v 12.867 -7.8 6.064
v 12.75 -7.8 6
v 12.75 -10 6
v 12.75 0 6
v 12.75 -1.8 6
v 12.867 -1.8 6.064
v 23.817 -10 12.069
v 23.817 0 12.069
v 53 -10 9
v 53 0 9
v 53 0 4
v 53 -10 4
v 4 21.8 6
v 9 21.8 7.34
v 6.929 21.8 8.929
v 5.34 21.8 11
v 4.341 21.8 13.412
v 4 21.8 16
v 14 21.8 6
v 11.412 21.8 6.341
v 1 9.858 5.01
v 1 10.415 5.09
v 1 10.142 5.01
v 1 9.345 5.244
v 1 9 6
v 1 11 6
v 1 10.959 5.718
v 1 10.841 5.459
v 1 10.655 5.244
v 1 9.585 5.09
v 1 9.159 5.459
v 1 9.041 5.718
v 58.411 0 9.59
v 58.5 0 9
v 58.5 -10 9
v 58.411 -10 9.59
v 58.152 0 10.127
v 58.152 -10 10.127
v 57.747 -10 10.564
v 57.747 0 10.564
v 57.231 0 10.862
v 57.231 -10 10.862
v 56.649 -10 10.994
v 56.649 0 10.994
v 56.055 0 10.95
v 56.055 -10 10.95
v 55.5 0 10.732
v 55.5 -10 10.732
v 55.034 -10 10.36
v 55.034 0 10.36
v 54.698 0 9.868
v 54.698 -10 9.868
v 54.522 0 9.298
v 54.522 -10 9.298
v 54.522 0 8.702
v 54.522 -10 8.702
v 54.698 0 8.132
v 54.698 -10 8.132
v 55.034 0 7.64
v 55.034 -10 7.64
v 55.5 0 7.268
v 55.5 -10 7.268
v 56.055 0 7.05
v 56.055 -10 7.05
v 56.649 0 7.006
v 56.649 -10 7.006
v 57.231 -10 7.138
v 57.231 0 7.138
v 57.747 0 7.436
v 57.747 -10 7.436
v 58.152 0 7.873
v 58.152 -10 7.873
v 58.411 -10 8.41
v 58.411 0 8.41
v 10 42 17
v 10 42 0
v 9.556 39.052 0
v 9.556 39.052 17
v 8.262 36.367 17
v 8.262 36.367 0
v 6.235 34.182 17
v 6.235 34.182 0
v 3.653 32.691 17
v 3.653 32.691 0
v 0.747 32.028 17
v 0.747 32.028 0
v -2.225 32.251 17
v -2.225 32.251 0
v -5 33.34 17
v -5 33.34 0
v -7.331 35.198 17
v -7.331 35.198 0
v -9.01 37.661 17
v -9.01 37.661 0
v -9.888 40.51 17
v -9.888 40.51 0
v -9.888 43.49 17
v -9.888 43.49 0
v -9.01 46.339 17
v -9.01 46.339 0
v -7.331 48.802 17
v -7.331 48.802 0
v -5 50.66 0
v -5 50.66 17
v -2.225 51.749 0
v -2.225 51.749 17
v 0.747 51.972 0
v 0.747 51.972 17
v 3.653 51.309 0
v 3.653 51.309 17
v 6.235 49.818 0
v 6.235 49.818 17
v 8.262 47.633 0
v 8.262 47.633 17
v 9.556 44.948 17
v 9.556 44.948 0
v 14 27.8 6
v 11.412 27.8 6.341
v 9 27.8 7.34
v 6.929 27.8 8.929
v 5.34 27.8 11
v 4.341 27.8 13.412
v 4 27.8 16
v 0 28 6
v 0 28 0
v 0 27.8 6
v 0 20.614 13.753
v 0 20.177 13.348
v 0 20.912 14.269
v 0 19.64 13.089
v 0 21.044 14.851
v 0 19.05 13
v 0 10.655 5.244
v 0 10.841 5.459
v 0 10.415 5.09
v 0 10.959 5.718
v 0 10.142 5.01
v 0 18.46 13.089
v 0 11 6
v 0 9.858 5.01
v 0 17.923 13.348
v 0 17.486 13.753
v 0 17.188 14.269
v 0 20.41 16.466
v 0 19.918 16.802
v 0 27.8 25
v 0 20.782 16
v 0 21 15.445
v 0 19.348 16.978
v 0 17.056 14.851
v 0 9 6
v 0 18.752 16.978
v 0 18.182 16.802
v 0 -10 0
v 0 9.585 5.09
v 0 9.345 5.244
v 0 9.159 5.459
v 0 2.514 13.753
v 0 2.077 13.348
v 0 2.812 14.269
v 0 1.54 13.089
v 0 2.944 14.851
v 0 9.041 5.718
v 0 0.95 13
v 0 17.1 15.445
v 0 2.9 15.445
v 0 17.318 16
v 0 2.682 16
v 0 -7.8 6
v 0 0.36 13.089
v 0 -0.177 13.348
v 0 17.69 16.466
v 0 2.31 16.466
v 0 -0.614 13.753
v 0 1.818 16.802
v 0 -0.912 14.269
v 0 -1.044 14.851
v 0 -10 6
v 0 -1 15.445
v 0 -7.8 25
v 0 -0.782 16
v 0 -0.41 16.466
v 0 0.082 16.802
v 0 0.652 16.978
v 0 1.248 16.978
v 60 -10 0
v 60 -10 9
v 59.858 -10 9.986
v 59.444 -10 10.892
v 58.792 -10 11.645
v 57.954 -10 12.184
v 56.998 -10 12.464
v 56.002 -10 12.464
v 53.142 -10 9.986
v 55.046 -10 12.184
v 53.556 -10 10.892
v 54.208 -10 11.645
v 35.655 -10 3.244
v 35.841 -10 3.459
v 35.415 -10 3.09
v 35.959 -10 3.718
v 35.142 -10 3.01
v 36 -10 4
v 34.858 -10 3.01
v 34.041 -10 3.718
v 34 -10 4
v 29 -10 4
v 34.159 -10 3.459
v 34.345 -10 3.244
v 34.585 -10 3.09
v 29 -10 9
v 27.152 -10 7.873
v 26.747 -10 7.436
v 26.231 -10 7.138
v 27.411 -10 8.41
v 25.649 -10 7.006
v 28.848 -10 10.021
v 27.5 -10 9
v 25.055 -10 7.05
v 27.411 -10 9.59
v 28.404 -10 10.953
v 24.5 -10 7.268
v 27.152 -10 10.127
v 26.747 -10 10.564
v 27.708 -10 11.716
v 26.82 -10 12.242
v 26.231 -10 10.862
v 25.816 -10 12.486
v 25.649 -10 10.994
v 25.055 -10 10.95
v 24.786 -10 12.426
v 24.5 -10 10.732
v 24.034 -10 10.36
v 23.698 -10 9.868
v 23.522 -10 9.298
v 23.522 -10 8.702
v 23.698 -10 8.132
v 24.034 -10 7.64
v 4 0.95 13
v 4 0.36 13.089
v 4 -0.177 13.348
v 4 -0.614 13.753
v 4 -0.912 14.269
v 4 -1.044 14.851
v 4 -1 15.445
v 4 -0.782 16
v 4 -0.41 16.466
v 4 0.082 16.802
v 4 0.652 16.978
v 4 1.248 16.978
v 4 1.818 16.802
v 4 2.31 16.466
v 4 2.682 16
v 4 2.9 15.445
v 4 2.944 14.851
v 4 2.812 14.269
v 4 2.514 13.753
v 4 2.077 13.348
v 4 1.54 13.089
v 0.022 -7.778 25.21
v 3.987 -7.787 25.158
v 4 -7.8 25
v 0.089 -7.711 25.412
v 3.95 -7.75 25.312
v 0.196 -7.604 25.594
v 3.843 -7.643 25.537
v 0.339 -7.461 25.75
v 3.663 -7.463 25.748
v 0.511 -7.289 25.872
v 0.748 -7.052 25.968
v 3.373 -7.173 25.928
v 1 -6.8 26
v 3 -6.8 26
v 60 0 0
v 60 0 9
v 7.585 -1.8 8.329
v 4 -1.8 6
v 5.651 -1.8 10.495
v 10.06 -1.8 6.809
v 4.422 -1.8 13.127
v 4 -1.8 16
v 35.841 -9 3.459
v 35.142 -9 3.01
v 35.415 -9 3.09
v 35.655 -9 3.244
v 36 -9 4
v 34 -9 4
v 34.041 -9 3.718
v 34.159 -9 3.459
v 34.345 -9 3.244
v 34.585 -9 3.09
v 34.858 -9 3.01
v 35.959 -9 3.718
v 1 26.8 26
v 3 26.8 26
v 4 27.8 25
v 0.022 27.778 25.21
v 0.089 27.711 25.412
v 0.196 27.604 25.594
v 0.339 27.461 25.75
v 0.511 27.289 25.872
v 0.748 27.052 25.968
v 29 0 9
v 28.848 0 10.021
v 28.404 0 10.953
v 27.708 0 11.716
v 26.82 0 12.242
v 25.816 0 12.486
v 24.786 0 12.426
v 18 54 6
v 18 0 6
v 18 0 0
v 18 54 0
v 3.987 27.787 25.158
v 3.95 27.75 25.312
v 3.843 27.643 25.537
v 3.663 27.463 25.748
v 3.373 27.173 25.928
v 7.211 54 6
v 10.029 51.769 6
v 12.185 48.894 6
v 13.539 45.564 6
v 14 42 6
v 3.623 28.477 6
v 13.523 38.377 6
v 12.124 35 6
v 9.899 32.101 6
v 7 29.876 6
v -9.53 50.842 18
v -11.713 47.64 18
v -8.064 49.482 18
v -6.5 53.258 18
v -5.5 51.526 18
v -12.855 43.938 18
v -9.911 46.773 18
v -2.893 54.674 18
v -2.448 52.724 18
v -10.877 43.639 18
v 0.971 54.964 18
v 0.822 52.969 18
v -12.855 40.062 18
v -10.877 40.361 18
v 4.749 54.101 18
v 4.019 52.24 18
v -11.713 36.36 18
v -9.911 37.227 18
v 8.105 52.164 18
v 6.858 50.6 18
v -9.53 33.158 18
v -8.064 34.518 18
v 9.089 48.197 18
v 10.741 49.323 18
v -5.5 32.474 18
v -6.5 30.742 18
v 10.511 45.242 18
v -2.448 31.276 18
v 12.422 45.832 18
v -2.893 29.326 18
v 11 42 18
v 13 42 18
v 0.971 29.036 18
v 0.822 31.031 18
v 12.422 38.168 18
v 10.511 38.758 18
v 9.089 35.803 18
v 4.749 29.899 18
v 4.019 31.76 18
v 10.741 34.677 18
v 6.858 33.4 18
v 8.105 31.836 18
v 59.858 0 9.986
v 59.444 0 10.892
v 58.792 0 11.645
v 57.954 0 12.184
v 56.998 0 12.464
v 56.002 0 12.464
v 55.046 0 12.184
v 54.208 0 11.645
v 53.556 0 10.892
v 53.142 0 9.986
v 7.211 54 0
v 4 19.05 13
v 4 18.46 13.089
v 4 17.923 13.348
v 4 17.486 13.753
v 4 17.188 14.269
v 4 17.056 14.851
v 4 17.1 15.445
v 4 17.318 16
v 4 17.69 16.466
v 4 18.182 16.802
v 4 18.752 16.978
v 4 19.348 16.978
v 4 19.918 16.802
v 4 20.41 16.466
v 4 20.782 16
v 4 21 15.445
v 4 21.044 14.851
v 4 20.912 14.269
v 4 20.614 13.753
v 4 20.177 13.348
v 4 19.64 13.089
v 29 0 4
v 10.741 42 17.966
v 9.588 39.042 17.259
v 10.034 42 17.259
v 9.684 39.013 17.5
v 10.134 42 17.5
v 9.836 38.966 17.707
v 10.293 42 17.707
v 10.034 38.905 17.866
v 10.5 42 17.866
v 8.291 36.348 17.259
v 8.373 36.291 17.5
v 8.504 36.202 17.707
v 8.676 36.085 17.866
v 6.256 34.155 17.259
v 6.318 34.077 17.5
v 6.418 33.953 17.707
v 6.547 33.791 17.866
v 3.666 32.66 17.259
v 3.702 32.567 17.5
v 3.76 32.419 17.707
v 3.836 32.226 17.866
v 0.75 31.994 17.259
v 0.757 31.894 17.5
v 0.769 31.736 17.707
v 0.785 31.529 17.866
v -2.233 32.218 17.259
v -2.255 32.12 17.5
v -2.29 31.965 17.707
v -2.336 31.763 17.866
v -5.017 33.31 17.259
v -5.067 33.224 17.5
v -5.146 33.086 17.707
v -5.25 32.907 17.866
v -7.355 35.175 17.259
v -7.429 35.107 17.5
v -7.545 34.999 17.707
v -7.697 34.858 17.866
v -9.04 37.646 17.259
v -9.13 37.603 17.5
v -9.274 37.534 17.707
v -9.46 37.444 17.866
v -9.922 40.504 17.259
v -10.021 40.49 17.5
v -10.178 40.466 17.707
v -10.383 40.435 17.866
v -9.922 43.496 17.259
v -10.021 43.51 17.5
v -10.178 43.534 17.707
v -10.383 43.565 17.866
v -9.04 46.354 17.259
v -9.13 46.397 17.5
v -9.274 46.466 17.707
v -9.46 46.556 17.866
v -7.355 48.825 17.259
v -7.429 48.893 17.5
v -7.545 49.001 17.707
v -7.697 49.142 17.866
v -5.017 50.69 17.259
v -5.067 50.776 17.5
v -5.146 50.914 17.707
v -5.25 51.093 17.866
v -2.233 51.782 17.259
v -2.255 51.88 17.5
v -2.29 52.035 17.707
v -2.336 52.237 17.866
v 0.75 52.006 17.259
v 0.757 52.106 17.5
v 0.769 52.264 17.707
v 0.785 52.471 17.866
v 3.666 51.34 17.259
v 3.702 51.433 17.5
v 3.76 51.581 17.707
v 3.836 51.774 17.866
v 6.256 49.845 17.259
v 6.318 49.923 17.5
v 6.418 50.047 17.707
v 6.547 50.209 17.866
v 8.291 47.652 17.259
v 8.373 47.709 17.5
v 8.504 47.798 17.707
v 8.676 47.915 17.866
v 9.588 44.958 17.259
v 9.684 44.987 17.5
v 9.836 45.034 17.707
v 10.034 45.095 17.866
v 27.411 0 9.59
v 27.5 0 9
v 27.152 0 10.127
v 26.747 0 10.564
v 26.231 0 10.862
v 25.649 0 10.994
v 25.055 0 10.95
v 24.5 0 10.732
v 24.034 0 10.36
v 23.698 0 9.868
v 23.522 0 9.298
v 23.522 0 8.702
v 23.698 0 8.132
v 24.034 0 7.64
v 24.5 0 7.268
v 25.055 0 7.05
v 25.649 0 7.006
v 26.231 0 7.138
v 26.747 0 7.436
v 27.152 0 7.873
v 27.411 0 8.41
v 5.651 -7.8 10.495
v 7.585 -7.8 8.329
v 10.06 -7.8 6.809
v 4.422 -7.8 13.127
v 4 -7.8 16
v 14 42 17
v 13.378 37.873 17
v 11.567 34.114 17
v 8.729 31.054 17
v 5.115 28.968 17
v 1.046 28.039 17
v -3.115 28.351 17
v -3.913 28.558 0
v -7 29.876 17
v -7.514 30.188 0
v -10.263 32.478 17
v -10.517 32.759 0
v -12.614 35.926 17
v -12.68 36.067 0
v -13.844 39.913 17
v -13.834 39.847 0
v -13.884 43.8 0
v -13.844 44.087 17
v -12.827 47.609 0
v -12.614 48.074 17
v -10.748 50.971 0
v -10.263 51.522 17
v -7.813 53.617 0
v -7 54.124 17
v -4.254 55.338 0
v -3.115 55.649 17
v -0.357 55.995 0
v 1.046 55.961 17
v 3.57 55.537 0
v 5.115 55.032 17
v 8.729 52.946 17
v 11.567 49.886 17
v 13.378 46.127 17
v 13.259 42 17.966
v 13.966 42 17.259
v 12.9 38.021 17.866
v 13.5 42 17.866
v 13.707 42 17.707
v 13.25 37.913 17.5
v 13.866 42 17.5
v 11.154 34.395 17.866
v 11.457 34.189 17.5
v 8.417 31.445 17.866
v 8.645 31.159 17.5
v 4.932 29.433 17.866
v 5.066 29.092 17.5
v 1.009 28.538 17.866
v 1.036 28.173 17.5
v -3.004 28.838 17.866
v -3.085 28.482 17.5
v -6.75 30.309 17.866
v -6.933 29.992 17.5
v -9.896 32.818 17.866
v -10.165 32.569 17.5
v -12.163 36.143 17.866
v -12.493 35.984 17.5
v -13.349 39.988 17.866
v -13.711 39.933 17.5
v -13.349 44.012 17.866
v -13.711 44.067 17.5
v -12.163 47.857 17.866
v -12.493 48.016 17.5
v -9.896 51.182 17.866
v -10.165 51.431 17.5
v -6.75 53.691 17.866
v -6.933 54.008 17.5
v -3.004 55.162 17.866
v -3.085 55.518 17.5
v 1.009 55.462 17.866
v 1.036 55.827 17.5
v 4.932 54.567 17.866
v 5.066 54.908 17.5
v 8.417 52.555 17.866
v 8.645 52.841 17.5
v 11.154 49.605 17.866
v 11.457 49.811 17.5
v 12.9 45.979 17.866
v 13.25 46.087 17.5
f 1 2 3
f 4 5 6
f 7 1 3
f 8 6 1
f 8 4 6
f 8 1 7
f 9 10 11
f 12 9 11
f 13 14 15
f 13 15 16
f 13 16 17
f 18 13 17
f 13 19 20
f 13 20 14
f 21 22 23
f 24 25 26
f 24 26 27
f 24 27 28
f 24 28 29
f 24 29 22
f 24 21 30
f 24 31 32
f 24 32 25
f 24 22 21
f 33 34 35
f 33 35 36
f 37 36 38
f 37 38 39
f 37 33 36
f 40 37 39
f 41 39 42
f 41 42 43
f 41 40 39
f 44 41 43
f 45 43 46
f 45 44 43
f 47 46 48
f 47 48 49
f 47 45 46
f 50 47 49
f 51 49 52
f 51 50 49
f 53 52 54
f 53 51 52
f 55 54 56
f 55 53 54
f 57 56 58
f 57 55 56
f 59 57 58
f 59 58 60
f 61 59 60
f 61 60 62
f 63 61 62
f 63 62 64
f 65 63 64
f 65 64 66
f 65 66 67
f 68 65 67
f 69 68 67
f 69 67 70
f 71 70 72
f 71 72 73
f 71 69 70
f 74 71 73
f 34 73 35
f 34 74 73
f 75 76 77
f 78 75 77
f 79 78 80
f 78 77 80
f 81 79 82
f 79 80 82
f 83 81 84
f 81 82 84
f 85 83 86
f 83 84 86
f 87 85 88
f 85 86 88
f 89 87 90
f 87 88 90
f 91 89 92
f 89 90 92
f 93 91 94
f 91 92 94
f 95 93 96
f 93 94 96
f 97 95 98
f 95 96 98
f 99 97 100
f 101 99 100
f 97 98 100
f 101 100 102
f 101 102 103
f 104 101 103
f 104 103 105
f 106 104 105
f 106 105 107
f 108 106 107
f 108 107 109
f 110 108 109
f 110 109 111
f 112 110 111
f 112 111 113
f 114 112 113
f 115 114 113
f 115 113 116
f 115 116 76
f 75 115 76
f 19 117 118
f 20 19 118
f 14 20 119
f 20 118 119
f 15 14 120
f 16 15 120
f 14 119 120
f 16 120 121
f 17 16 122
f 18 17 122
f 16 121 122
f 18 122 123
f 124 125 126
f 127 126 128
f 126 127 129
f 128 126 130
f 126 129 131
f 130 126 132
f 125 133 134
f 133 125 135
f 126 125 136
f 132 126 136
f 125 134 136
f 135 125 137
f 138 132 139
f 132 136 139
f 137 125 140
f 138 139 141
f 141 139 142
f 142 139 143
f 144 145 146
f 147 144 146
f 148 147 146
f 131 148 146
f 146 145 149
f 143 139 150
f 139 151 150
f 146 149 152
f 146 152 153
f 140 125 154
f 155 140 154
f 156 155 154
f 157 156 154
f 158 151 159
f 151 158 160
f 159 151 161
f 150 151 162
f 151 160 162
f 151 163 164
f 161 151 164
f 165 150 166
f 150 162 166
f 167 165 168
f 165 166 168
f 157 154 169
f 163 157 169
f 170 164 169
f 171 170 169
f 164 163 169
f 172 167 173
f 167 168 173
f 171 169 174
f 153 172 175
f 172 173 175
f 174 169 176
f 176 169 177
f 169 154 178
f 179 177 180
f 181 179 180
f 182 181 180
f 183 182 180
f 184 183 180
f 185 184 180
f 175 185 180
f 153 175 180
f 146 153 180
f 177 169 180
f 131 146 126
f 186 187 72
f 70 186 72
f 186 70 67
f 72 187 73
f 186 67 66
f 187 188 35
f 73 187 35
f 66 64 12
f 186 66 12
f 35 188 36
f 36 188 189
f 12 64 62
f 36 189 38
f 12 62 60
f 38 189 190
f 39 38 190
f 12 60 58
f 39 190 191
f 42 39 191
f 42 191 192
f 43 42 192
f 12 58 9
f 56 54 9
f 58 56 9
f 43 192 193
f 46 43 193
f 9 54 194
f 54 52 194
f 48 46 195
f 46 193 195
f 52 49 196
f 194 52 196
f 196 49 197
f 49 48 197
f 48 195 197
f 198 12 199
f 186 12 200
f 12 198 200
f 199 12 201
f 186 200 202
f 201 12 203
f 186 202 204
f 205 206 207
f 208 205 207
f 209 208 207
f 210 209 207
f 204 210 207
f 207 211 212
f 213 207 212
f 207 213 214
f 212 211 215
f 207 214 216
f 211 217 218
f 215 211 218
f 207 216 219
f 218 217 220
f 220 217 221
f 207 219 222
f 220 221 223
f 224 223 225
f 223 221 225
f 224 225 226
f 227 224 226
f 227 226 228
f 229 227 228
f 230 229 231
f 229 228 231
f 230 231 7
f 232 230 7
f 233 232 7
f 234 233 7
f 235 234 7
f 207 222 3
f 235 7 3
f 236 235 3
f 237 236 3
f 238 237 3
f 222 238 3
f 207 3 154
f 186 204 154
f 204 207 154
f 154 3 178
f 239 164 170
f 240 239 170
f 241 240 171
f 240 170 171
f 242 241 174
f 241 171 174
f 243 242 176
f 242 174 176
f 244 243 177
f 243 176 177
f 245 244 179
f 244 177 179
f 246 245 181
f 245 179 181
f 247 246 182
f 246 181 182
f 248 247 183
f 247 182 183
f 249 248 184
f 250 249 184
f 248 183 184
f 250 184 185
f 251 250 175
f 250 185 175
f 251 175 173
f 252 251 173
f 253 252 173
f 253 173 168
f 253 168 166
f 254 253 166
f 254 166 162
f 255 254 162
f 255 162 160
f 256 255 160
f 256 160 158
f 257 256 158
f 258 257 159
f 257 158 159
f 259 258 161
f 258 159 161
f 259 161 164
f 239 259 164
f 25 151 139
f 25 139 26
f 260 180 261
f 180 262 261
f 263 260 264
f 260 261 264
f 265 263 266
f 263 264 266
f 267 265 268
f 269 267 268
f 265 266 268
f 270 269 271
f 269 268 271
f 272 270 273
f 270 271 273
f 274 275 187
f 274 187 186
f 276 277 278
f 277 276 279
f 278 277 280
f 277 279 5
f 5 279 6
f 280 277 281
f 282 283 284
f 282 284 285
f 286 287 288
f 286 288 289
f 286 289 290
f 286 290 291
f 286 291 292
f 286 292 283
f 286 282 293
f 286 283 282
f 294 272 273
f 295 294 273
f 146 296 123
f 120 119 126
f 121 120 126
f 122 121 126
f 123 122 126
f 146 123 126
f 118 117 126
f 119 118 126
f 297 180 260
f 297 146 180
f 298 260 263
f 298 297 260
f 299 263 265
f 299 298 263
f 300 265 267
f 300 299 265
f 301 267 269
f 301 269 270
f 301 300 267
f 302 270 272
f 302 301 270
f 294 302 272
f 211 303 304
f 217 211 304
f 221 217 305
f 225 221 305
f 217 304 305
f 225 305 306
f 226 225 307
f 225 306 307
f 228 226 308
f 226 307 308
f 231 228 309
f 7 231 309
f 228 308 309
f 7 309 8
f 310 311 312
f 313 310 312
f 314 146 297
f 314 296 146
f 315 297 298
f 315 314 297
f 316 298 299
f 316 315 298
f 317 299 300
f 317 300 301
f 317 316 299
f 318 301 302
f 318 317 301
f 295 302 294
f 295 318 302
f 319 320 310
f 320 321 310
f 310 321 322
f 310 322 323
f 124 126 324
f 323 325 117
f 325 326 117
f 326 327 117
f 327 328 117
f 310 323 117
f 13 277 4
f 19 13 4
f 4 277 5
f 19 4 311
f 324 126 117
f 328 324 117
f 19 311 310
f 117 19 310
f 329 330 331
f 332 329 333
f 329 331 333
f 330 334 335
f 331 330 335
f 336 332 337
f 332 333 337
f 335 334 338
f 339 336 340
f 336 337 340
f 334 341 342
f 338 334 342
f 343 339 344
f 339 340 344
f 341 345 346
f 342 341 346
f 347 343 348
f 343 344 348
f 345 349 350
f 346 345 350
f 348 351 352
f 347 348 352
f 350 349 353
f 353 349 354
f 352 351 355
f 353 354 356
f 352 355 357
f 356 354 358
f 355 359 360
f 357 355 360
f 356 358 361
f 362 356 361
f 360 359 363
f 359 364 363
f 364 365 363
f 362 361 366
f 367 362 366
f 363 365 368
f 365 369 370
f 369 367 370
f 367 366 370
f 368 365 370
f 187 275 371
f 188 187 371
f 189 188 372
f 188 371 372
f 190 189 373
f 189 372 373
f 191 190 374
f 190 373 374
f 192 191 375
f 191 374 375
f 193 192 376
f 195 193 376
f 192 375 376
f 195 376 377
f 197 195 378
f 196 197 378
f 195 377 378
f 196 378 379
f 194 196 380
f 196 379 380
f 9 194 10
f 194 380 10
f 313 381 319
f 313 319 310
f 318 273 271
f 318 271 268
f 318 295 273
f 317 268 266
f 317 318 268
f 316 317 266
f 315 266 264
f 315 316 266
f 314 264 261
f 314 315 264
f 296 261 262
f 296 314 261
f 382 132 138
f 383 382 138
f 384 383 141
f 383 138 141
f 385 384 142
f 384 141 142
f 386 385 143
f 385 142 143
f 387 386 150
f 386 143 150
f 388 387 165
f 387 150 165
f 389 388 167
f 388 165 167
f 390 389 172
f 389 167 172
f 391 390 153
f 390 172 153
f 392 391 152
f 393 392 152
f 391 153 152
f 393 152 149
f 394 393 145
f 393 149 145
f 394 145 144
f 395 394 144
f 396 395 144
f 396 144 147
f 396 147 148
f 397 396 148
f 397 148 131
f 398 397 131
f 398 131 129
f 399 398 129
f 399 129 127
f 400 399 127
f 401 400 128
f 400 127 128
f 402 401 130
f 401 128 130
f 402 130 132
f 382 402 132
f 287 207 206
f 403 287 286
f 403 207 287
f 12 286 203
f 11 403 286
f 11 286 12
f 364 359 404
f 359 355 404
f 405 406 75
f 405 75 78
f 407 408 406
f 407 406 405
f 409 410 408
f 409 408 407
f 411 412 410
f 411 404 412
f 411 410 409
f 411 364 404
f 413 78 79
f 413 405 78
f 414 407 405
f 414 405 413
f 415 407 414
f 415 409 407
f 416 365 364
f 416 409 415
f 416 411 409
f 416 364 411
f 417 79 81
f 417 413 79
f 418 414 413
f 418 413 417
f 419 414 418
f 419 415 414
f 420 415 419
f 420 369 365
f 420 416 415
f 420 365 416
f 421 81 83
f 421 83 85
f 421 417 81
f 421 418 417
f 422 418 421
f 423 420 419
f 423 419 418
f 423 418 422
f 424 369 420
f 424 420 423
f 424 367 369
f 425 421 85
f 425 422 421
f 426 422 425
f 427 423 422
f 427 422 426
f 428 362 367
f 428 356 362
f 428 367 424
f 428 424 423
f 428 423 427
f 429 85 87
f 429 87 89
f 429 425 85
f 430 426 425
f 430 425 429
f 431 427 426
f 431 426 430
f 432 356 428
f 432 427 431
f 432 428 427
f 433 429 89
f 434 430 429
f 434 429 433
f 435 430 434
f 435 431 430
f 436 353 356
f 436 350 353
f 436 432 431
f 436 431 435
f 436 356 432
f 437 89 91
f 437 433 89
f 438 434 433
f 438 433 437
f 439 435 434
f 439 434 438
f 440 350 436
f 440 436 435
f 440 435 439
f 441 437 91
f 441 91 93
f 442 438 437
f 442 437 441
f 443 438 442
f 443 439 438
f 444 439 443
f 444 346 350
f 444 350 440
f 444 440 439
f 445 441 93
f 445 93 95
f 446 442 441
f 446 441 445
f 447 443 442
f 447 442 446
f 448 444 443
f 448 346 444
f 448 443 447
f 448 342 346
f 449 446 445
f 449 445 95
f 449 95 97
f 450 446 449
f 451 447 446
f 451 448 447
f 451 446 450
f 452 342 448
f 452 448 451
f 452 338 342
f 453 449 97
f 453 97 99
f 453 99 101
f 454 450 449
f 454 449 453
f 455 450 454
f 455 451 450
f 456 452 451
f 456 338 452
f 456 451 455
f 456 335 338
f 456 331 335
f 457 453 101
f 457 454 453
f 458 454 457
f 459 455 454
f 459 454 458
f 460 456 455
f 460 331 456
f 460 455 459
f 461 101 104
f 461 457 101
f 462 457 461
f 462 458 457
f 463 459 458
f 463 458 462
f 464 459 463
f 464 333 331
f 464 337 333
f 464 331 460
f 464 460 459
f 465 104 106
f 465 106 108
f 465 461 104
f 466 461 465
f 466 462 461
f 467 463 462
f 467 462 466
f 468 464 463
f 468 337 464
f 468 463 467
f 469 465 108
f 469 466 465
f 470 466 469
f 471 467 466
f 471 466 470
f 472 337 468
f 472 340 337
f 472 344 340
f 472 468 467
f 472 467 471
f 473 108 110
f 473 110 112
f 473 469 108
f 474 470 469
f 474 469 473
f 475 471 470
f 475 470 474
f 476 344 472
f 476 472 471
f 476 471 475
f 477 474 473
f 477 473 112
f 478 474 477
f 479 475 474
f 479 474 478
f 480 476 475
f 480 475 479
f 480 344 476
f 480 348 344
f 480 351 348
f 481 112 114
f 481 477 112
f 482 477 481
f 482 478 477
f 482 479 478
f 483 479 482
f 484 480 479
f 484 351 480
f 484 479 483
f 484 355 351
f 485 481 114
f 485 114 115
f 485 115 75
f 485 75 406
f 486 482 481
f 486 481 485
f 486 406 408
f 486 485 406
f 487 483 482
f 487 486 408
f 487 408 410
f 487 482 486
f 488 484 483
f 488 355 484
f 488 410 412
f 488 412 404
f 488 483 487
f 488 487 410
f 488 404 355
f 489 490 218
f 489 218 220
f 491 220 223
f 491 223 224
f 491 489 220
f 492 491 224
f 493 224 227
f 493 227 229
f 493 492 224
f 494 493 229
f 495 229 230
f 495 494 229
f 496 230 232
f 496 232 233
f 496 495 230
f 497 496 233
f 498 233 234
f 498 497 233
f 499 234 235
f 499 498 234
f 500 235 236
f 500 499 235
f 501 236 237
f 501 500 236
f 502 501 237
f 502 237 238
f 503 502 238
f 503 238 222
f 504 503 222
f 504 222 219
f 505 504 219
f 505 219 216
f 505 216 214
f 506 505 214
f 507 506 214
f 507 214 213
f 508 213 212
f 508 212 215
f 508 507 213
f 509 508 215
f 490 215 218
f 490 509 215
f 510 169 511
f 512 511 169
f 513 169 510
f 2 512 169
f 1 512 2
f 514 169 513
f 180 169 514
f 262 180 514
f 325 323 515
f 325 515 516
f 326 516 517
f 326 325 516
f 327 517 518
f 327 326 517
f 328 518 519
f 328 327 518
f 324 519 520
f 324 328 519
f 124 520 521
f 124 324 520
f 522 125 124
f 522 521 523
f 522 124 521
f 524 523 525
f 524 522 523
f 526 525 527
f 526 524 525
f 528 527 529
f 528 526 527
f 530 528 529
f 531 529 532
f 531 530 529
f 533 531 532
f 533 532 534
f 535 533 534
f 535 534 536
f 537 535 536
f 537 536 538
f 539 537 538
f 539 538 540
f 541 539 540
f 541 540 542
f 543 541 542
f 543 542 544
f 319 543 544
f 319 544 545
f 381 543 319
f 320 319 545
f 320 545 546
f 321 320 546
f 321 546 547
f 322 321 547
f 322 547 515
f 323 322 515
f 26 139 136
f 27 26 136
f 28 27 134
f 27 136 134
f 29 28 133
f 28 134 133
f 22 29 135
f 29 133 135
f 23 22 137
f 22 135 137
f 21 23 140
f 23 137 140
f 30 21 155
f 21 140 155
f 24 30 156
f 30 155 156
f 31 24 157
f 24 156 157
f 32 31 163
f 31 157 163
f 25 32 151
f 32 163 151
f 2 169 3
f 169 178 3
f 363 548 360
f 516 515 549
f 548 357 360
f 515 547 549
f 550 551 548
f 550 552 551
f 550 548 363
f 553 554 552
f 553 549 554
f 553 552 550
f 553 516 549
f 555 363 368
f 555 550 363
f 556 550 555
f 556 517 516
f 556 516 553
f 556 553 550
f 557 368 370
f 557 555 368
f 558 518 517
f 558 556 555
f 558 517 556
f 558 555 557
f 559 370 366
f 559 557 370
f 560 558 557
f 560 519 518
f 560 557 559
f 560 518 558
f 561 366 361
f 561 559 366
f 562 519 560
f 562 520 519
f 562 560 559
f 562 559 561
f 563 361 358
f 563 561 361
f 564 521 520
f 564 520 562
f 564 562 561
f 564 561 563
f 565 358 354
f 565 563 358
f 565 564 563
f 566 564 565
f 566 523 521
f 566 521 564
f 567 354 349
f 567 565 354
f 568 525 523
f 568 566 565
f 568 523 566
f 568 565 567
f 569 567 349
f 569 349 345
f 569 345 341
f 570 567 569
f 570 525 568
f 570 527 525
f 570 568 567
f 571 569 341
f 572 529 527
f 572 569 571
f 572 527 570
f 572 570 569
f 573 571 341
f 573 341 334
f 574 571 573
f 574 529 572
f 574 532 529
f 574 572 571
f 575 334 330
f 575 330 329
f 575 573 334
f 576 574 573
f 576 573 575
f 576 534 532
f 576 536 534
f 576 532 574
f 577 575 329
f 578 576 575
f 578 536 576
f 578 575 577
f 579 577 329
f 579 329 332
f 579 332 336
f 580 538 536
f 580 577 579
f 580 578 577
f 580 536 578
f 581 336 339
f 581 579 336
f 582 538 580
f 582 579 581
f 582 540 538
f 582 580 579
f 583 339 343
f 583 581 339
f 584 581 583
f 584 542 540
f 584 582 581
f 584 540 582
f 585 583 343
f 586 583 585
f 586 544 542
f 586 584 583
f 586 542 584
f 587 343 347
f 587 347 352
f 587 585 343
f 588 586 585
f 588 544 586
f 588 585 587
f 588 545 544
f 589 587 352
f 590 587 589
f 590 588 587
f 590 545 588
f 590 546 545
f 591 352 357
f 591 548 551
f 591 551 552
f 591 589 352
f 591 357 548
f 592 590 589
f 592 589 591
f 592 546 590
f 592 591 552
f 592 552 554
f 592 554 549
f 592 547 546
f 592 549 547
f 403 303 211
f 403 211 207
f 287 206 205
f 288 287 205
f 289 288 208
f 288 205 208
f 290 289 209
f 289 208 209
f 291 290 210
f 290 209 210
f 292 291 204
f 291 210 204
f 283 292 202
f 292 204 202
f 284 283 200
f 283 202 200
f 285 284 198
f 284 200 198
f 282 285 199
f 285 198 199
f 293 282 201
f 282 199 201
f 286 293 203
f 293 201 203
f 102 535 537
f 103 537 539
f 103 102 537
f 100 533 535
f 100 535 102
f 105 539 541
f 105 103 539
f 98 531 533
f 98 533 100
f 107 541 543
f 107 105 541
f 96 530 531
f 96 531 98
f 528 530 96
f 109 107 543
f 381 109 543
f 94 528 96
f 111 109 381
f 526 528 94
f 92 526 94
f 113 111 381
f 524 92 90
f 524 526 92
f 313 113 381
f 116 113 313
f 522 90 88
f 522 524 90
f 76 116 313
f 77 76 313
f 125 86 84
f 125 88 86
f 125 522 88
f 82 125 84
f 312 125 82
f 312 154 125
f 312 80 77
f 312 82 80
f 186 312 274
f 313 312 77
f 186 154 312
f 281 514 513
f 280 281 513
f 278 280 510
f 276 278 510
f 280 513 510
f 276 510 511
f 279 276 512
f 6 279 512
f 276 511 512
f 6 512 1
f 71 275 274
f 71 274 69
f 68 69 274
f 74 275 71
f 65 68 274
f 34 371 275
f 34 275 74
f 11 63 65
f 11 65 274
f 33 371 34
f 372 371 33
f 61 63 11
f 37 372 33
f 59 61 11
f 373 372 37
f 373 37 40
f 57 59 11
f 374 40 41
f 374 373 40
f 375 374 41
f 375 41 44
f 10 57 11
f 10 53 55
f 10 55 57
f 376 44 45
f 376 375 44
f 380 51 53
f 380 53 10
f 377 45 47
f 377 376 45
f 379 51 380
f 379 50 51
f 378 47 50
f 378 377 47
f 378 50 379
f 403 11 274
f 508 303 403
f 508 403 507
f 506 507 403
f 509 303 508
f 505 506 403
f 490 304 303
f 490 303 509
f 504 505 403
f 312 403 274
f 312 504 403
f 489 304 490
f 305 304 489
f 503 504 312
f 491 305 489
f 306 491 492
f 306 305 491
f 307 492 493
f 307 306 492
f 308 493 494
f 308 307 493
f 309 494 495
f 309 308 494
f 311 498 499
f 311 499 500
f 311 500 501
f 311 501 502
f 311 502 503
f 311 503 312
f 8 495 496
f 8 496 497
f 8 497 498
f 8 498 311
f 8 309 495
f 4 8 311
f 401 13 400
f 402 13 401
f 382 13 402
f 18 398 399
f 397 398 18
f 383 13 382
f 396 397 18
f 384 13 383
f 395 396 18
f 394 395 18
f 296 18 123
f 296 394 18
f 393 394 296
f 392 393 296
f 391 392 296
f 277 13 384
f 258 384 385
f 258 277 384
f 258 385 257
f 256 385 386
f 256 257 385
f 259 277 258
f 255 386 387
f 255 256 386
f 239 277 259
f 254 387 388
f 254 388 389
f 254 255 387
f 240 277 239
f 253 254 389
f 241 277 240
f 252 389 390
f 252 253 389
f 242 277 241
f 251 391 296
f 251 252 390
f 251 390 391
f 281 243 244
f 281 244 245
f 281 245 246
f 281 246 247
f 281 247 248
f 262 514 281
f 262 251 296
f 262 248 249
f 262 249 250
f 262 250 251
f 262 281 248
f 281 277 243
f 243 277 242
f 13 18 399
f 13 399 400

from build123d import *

# Parameters (mm, degrees)
SKETCH_R        = 2
PAD_DEPTH       = 10
POCKET004_DEPTH = 1
SKETCH002_W     = 18
SKETCH002_H     = 6
PAD002_DEPTH    = 54
POCKET005_DEPTH = 1
SKETCH003_R     = 14
PAD003_DEPTH    = 18
SKETCH004_R     = 10
POCKET_DEPTH    = 18.001
SKETCH001_W     = 4
SKETCH001_H     = 20
PAD001_DEPTH    = 35.6
SKETCH005_R     = 2
POCKET001_DEPTH = 4
SKETCH006_R     = 2
POCKET002_DEPTH = 4
PAD004_DEPTH    = 6
PAD005_DEPTH    = 6
FILLET_R        = 1


with BuildPart() as part:
    # Sketch → Pad (new body)
    with BuildSketch(Plane.XZ):
        with BuildLine():
            Line((60, 0), (0, 0))
            Line((0, 0), (0, 6))
            Line((12.75, 6), (0, 6))
            Line((12.75, 6), (23.817129, 12.068867))
            ThreePointArc((29, 9), (27.283249, 12.011648), (23.817129, 12.068867))
            Line((29, 9), (29, 4))
            Line((29, 4), (53, 4))
            Line((53, 9), (53, 4))
            ThreePointArc((60, 9), (56.5, 12.5), (53, 9))
            Line((60, 9), (60, 0))
        make_face()
        with Locations((56.5, 9)):
            Circle(SKETCH_R, mode=Mode.SUBTRACT)
        with Locations((25.5, 9)):
            Circle(SKETCH_R, mode=Mode.SUBTRACT)
    extrude(amount=PAD_DEPTH)

    # Sketch007 (on Face14 of Pad) → Pocket004 (cut)
    with BuildSketch(Plane.XZ.offset(10)):
        with BuildLine():
            ThreePointArc((34, 4), (35, 3), (36, 4))
            Line((34, 4), (36, 4))
        make_face()
    extrude(amount=-POCKET004_DEPTH, mode=Mode.SUBTRACT)

    # Sketch002 (on Face13 of Pad) → Pad002 (join)
    with BuildSketch(Plane(origin=(0, 0, 0), x_dir=(1, 0, 0), z_dir=(0, 1, 0))):
        with Locations((9, -3)):
            Rectangle(SKETCH002_W, SKETCH002_H)
    extrude(amount=PAD002_DEPTH)

    # Sketch008 (on Face19 of Pad002) → Pocket005 (cut)
    with BuildSketch(Plane(origin=(0, 0, 0), x_dir=(0, 0, -1), z_dir=(-1, 0, 0))):
        with BuildLine():
            Line((-6, -9), (-6, -11))
            ThreePointArc((-6, -11), (-5, -10), (-6, -9))
        make_face()
    extrude(amount=-POCKET005_DEPTH, mode=Mode.SUBTRACT)

    # Sketch003 (on Face21 of Pad002) → Pad003 (join)
    with BuildSketch(Plane(origin=(0, 0, 0), x_dir=(1, 0, 0), z_dir=(0, 0, -1))):
        with Locations((0, -42)):
            Circle(SKETCH003_R)
    extrude(amount=-PAD003_DEPTH)

    # Sketch004 (on Face21 of Pad002) → Pocket (cut, through all)
    with BuildSketch(Plane(origin=(0, 0, 0), x_dir=(1, 0, 0), z_dir=(0, 0, -1))):
        with Locations((0, -42)):
            Circle(SKETCH004_R)
    extrude(amount=-POCKET_DEPTH, mode=Mode.SUBTRACT)

    # Sketch001 (on Face14 of Pad) → Pad001 (join)
    with BuildSketch(Plane.XZ.offset(7.8)):
        with Locations((2, 16)):
            Rectangle(SKETCH001_W, SKETCH001_H)
    extrude(amount=-PAD001_DEPTH)

    # Sketch005 (on Face26 of Pad001) → Pocket001 (cut)
    with BuildSketch(Plane(origin=(0, 0, 0), x_dir=(0, 0, -1), z_dir=(-1, 0, 0))):
        with Locations((-15, -0.95)):
            Circle(SKETCH005_R)
    extrude(amount=-POCKET001_DEPTH, mode=Mode.SUBTRACT)

    # Sketch006 (on Face26 of Pad001) → Pocket002 (cut)
    with BuildSketch(Plane(origin=(0, 0, 0), x_dir=(0, 0, -1), z_dir=(-1, 0, 0))):
        with Locations((-15, -19.05)):
            Circle(SKETCH006_R)
    extrude(amount=-POCKET002_DEPTH, mode=Mode.SUBTRACT)

    # Sketch009 (on Face25 of Pad001) → Pad004 (join)
    with BuildSketch(Plane.XZ.offset(7.8)):
        with BuildLine():
            Line((4, 16), (4, 6))
            Line((4, 6), (14, 6))
            ThreePointArc((4, 16), (6.928932, 8.928932), (14, 6))
        make_face()
    extrude(amount=-PAD004_DEPTH)

    # Sketch010 (on Face20 of Pad001) → Pad005 (join)
    with BuildSketch(Plane(origin=(0, 27.8, 0), x_dir=(1, 0, 0), z_dir=(0, 1, 0))):
        with BuildLine():
            Line((4, -16), (4, -6))
            Line((4, -6), (13.999971, -6))
            ThreePointArc((13.999971, -6), (6.928922, -8.928942), (4, -16))
        make_face()
    extrude(amount=-PAD005_DEPTH)

    # Fillet
    fillet_edges = [part.edges().sort_by_distance(p)[0] for p in [
        (4, 10, 26),
        (0, 10, 26),
        (2, -7.8, 26),
        (2, 27.8, 26),
        (-14, 42, 18),
        (-10, 42, 18),
    ]]
    fillet(fillet_edges, radius=FILLET_R)


solid = part.part
